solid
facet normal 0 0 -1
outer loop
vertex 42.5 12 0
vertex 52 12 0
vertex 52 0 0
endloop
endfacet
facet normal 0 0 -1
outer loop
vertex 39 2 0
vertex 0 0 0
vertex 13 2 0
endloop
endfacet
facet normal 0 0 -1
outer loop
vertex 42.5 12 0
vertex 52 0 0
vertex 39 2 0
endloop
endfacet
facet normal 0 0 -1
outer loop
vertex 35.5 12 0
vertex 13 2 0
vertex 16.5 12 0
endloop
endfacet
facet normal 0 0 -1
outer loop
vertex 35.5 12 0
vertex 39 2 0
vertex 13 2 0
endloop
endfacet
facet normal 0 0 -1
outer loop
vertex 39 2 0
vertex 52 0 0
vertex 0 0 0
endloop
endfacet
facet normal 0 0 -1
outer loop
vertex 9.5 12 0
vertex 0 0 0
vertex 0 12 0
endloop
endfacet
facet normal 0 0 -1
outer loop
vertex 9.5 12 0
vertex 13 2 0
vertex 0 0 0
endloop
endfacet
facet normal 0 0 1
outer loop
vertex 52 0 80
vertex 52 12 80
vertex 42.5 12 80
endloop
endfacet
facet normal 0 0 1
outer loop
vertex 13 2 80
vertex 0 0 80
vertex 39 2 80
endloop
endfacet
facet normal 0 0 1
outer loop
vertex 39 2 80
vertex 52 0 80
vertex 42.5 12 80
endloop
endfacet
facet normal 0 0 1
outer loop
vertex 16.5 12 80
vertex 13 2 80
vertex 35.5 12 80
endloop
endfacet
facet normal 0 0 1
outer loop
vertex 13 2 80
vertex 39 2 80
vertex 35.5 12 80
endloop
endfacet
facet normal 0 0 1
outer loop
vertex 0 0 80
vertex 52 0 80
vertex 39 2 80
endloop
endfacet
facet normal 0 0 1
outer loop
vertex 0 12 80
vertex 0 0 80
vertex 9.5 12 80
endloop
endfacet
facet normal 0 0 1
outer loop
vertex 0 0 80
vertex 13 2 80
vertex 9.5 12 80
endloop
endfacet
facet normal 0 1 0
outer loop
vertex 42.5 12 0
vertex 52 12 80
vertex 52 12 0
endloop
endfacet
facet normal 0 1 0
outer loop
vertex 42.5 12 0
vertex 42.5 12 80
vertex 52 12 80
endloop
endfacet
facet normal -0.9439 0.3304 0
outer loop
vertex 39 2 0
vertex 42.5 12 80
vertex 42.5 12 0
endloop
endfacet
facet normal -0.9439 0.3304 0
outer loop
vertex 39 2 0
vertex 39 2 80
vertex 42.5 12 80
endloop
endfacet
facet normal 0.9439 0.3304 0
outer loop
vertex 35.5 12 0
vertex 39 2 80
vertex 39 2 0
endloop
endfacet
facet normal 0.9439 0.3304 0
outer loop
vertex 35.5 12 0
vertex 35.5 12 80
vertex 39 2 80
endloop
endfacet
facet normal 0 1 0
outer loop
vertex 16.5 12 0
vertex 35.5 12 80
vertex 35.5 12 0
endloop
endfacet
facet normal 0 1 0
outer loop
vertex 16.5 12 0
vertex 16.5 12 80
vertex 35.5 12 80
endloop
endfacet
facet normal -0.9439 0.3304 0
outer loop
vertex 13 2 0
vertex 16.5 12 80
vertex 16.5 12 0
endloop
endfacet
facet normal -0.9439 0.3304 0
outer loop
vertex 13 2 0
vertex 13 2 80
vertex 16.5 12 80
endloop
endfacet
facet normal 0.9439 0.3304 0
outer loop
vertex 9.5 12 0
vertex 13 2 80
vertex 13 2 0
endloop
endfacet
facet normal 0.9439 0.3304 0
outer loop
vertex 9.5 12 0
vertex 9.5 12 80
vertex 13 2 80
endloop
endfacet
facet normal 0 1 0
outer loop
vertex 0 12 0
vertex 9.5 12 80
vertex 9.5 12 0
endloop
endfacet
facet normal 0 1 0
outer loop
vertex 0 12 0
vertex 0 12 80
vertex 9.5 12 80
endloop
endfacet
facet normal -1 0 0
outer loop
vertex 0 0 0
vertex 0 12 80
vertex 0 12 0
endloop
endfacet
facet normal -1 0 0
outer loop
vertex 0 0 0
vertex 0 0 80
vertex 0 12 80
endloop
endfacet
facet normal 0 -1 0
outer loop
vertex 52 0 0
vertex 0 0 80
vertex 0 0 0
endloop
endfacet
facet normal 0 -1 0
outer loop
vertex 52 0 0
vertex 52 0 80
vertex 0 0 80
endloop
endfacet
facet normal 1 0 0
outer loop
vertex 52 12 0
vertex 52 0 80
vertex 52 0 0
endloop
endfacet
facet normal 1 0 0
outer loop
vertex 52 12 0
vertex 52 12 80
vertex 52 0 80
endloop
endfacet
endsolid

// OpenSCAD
$fn = 32;

// ----------------------------------------------------------------------
// V guide rail: doublev, 52 mm wide
// ----------------------------------------------------------------------

// --- parameters (mm) ---
rail_w = 52;              // rail width, X
base_t = 12;              // base plate thickness
v_depth = 10;             // V feature depth / height
v_half_w = 7;             // half width of the V at the base face
plate_t = 80;             // rail length, Z (the extrusion height)
groove_off = 13;          // offset of each groove from the centreline

centre_x = rail_w / 2;  // rail centreline
groove_a = centre_x - groove_off;  // axis of the first groove
groove_b = centre_x + groove_off;  // axis of the second groove

profile = [[0, 0], [52, 0], [52, 12], [42.5, 12], [39, 2], [35.5, 12], [16.5, 12], [13, 2], [9.5, 12], [0, 12]];  // primary outline, 10 points, counter clockwise

// --- the one profile operation ---
linear_extrude(height = plate_t) polygon(points = profile);
